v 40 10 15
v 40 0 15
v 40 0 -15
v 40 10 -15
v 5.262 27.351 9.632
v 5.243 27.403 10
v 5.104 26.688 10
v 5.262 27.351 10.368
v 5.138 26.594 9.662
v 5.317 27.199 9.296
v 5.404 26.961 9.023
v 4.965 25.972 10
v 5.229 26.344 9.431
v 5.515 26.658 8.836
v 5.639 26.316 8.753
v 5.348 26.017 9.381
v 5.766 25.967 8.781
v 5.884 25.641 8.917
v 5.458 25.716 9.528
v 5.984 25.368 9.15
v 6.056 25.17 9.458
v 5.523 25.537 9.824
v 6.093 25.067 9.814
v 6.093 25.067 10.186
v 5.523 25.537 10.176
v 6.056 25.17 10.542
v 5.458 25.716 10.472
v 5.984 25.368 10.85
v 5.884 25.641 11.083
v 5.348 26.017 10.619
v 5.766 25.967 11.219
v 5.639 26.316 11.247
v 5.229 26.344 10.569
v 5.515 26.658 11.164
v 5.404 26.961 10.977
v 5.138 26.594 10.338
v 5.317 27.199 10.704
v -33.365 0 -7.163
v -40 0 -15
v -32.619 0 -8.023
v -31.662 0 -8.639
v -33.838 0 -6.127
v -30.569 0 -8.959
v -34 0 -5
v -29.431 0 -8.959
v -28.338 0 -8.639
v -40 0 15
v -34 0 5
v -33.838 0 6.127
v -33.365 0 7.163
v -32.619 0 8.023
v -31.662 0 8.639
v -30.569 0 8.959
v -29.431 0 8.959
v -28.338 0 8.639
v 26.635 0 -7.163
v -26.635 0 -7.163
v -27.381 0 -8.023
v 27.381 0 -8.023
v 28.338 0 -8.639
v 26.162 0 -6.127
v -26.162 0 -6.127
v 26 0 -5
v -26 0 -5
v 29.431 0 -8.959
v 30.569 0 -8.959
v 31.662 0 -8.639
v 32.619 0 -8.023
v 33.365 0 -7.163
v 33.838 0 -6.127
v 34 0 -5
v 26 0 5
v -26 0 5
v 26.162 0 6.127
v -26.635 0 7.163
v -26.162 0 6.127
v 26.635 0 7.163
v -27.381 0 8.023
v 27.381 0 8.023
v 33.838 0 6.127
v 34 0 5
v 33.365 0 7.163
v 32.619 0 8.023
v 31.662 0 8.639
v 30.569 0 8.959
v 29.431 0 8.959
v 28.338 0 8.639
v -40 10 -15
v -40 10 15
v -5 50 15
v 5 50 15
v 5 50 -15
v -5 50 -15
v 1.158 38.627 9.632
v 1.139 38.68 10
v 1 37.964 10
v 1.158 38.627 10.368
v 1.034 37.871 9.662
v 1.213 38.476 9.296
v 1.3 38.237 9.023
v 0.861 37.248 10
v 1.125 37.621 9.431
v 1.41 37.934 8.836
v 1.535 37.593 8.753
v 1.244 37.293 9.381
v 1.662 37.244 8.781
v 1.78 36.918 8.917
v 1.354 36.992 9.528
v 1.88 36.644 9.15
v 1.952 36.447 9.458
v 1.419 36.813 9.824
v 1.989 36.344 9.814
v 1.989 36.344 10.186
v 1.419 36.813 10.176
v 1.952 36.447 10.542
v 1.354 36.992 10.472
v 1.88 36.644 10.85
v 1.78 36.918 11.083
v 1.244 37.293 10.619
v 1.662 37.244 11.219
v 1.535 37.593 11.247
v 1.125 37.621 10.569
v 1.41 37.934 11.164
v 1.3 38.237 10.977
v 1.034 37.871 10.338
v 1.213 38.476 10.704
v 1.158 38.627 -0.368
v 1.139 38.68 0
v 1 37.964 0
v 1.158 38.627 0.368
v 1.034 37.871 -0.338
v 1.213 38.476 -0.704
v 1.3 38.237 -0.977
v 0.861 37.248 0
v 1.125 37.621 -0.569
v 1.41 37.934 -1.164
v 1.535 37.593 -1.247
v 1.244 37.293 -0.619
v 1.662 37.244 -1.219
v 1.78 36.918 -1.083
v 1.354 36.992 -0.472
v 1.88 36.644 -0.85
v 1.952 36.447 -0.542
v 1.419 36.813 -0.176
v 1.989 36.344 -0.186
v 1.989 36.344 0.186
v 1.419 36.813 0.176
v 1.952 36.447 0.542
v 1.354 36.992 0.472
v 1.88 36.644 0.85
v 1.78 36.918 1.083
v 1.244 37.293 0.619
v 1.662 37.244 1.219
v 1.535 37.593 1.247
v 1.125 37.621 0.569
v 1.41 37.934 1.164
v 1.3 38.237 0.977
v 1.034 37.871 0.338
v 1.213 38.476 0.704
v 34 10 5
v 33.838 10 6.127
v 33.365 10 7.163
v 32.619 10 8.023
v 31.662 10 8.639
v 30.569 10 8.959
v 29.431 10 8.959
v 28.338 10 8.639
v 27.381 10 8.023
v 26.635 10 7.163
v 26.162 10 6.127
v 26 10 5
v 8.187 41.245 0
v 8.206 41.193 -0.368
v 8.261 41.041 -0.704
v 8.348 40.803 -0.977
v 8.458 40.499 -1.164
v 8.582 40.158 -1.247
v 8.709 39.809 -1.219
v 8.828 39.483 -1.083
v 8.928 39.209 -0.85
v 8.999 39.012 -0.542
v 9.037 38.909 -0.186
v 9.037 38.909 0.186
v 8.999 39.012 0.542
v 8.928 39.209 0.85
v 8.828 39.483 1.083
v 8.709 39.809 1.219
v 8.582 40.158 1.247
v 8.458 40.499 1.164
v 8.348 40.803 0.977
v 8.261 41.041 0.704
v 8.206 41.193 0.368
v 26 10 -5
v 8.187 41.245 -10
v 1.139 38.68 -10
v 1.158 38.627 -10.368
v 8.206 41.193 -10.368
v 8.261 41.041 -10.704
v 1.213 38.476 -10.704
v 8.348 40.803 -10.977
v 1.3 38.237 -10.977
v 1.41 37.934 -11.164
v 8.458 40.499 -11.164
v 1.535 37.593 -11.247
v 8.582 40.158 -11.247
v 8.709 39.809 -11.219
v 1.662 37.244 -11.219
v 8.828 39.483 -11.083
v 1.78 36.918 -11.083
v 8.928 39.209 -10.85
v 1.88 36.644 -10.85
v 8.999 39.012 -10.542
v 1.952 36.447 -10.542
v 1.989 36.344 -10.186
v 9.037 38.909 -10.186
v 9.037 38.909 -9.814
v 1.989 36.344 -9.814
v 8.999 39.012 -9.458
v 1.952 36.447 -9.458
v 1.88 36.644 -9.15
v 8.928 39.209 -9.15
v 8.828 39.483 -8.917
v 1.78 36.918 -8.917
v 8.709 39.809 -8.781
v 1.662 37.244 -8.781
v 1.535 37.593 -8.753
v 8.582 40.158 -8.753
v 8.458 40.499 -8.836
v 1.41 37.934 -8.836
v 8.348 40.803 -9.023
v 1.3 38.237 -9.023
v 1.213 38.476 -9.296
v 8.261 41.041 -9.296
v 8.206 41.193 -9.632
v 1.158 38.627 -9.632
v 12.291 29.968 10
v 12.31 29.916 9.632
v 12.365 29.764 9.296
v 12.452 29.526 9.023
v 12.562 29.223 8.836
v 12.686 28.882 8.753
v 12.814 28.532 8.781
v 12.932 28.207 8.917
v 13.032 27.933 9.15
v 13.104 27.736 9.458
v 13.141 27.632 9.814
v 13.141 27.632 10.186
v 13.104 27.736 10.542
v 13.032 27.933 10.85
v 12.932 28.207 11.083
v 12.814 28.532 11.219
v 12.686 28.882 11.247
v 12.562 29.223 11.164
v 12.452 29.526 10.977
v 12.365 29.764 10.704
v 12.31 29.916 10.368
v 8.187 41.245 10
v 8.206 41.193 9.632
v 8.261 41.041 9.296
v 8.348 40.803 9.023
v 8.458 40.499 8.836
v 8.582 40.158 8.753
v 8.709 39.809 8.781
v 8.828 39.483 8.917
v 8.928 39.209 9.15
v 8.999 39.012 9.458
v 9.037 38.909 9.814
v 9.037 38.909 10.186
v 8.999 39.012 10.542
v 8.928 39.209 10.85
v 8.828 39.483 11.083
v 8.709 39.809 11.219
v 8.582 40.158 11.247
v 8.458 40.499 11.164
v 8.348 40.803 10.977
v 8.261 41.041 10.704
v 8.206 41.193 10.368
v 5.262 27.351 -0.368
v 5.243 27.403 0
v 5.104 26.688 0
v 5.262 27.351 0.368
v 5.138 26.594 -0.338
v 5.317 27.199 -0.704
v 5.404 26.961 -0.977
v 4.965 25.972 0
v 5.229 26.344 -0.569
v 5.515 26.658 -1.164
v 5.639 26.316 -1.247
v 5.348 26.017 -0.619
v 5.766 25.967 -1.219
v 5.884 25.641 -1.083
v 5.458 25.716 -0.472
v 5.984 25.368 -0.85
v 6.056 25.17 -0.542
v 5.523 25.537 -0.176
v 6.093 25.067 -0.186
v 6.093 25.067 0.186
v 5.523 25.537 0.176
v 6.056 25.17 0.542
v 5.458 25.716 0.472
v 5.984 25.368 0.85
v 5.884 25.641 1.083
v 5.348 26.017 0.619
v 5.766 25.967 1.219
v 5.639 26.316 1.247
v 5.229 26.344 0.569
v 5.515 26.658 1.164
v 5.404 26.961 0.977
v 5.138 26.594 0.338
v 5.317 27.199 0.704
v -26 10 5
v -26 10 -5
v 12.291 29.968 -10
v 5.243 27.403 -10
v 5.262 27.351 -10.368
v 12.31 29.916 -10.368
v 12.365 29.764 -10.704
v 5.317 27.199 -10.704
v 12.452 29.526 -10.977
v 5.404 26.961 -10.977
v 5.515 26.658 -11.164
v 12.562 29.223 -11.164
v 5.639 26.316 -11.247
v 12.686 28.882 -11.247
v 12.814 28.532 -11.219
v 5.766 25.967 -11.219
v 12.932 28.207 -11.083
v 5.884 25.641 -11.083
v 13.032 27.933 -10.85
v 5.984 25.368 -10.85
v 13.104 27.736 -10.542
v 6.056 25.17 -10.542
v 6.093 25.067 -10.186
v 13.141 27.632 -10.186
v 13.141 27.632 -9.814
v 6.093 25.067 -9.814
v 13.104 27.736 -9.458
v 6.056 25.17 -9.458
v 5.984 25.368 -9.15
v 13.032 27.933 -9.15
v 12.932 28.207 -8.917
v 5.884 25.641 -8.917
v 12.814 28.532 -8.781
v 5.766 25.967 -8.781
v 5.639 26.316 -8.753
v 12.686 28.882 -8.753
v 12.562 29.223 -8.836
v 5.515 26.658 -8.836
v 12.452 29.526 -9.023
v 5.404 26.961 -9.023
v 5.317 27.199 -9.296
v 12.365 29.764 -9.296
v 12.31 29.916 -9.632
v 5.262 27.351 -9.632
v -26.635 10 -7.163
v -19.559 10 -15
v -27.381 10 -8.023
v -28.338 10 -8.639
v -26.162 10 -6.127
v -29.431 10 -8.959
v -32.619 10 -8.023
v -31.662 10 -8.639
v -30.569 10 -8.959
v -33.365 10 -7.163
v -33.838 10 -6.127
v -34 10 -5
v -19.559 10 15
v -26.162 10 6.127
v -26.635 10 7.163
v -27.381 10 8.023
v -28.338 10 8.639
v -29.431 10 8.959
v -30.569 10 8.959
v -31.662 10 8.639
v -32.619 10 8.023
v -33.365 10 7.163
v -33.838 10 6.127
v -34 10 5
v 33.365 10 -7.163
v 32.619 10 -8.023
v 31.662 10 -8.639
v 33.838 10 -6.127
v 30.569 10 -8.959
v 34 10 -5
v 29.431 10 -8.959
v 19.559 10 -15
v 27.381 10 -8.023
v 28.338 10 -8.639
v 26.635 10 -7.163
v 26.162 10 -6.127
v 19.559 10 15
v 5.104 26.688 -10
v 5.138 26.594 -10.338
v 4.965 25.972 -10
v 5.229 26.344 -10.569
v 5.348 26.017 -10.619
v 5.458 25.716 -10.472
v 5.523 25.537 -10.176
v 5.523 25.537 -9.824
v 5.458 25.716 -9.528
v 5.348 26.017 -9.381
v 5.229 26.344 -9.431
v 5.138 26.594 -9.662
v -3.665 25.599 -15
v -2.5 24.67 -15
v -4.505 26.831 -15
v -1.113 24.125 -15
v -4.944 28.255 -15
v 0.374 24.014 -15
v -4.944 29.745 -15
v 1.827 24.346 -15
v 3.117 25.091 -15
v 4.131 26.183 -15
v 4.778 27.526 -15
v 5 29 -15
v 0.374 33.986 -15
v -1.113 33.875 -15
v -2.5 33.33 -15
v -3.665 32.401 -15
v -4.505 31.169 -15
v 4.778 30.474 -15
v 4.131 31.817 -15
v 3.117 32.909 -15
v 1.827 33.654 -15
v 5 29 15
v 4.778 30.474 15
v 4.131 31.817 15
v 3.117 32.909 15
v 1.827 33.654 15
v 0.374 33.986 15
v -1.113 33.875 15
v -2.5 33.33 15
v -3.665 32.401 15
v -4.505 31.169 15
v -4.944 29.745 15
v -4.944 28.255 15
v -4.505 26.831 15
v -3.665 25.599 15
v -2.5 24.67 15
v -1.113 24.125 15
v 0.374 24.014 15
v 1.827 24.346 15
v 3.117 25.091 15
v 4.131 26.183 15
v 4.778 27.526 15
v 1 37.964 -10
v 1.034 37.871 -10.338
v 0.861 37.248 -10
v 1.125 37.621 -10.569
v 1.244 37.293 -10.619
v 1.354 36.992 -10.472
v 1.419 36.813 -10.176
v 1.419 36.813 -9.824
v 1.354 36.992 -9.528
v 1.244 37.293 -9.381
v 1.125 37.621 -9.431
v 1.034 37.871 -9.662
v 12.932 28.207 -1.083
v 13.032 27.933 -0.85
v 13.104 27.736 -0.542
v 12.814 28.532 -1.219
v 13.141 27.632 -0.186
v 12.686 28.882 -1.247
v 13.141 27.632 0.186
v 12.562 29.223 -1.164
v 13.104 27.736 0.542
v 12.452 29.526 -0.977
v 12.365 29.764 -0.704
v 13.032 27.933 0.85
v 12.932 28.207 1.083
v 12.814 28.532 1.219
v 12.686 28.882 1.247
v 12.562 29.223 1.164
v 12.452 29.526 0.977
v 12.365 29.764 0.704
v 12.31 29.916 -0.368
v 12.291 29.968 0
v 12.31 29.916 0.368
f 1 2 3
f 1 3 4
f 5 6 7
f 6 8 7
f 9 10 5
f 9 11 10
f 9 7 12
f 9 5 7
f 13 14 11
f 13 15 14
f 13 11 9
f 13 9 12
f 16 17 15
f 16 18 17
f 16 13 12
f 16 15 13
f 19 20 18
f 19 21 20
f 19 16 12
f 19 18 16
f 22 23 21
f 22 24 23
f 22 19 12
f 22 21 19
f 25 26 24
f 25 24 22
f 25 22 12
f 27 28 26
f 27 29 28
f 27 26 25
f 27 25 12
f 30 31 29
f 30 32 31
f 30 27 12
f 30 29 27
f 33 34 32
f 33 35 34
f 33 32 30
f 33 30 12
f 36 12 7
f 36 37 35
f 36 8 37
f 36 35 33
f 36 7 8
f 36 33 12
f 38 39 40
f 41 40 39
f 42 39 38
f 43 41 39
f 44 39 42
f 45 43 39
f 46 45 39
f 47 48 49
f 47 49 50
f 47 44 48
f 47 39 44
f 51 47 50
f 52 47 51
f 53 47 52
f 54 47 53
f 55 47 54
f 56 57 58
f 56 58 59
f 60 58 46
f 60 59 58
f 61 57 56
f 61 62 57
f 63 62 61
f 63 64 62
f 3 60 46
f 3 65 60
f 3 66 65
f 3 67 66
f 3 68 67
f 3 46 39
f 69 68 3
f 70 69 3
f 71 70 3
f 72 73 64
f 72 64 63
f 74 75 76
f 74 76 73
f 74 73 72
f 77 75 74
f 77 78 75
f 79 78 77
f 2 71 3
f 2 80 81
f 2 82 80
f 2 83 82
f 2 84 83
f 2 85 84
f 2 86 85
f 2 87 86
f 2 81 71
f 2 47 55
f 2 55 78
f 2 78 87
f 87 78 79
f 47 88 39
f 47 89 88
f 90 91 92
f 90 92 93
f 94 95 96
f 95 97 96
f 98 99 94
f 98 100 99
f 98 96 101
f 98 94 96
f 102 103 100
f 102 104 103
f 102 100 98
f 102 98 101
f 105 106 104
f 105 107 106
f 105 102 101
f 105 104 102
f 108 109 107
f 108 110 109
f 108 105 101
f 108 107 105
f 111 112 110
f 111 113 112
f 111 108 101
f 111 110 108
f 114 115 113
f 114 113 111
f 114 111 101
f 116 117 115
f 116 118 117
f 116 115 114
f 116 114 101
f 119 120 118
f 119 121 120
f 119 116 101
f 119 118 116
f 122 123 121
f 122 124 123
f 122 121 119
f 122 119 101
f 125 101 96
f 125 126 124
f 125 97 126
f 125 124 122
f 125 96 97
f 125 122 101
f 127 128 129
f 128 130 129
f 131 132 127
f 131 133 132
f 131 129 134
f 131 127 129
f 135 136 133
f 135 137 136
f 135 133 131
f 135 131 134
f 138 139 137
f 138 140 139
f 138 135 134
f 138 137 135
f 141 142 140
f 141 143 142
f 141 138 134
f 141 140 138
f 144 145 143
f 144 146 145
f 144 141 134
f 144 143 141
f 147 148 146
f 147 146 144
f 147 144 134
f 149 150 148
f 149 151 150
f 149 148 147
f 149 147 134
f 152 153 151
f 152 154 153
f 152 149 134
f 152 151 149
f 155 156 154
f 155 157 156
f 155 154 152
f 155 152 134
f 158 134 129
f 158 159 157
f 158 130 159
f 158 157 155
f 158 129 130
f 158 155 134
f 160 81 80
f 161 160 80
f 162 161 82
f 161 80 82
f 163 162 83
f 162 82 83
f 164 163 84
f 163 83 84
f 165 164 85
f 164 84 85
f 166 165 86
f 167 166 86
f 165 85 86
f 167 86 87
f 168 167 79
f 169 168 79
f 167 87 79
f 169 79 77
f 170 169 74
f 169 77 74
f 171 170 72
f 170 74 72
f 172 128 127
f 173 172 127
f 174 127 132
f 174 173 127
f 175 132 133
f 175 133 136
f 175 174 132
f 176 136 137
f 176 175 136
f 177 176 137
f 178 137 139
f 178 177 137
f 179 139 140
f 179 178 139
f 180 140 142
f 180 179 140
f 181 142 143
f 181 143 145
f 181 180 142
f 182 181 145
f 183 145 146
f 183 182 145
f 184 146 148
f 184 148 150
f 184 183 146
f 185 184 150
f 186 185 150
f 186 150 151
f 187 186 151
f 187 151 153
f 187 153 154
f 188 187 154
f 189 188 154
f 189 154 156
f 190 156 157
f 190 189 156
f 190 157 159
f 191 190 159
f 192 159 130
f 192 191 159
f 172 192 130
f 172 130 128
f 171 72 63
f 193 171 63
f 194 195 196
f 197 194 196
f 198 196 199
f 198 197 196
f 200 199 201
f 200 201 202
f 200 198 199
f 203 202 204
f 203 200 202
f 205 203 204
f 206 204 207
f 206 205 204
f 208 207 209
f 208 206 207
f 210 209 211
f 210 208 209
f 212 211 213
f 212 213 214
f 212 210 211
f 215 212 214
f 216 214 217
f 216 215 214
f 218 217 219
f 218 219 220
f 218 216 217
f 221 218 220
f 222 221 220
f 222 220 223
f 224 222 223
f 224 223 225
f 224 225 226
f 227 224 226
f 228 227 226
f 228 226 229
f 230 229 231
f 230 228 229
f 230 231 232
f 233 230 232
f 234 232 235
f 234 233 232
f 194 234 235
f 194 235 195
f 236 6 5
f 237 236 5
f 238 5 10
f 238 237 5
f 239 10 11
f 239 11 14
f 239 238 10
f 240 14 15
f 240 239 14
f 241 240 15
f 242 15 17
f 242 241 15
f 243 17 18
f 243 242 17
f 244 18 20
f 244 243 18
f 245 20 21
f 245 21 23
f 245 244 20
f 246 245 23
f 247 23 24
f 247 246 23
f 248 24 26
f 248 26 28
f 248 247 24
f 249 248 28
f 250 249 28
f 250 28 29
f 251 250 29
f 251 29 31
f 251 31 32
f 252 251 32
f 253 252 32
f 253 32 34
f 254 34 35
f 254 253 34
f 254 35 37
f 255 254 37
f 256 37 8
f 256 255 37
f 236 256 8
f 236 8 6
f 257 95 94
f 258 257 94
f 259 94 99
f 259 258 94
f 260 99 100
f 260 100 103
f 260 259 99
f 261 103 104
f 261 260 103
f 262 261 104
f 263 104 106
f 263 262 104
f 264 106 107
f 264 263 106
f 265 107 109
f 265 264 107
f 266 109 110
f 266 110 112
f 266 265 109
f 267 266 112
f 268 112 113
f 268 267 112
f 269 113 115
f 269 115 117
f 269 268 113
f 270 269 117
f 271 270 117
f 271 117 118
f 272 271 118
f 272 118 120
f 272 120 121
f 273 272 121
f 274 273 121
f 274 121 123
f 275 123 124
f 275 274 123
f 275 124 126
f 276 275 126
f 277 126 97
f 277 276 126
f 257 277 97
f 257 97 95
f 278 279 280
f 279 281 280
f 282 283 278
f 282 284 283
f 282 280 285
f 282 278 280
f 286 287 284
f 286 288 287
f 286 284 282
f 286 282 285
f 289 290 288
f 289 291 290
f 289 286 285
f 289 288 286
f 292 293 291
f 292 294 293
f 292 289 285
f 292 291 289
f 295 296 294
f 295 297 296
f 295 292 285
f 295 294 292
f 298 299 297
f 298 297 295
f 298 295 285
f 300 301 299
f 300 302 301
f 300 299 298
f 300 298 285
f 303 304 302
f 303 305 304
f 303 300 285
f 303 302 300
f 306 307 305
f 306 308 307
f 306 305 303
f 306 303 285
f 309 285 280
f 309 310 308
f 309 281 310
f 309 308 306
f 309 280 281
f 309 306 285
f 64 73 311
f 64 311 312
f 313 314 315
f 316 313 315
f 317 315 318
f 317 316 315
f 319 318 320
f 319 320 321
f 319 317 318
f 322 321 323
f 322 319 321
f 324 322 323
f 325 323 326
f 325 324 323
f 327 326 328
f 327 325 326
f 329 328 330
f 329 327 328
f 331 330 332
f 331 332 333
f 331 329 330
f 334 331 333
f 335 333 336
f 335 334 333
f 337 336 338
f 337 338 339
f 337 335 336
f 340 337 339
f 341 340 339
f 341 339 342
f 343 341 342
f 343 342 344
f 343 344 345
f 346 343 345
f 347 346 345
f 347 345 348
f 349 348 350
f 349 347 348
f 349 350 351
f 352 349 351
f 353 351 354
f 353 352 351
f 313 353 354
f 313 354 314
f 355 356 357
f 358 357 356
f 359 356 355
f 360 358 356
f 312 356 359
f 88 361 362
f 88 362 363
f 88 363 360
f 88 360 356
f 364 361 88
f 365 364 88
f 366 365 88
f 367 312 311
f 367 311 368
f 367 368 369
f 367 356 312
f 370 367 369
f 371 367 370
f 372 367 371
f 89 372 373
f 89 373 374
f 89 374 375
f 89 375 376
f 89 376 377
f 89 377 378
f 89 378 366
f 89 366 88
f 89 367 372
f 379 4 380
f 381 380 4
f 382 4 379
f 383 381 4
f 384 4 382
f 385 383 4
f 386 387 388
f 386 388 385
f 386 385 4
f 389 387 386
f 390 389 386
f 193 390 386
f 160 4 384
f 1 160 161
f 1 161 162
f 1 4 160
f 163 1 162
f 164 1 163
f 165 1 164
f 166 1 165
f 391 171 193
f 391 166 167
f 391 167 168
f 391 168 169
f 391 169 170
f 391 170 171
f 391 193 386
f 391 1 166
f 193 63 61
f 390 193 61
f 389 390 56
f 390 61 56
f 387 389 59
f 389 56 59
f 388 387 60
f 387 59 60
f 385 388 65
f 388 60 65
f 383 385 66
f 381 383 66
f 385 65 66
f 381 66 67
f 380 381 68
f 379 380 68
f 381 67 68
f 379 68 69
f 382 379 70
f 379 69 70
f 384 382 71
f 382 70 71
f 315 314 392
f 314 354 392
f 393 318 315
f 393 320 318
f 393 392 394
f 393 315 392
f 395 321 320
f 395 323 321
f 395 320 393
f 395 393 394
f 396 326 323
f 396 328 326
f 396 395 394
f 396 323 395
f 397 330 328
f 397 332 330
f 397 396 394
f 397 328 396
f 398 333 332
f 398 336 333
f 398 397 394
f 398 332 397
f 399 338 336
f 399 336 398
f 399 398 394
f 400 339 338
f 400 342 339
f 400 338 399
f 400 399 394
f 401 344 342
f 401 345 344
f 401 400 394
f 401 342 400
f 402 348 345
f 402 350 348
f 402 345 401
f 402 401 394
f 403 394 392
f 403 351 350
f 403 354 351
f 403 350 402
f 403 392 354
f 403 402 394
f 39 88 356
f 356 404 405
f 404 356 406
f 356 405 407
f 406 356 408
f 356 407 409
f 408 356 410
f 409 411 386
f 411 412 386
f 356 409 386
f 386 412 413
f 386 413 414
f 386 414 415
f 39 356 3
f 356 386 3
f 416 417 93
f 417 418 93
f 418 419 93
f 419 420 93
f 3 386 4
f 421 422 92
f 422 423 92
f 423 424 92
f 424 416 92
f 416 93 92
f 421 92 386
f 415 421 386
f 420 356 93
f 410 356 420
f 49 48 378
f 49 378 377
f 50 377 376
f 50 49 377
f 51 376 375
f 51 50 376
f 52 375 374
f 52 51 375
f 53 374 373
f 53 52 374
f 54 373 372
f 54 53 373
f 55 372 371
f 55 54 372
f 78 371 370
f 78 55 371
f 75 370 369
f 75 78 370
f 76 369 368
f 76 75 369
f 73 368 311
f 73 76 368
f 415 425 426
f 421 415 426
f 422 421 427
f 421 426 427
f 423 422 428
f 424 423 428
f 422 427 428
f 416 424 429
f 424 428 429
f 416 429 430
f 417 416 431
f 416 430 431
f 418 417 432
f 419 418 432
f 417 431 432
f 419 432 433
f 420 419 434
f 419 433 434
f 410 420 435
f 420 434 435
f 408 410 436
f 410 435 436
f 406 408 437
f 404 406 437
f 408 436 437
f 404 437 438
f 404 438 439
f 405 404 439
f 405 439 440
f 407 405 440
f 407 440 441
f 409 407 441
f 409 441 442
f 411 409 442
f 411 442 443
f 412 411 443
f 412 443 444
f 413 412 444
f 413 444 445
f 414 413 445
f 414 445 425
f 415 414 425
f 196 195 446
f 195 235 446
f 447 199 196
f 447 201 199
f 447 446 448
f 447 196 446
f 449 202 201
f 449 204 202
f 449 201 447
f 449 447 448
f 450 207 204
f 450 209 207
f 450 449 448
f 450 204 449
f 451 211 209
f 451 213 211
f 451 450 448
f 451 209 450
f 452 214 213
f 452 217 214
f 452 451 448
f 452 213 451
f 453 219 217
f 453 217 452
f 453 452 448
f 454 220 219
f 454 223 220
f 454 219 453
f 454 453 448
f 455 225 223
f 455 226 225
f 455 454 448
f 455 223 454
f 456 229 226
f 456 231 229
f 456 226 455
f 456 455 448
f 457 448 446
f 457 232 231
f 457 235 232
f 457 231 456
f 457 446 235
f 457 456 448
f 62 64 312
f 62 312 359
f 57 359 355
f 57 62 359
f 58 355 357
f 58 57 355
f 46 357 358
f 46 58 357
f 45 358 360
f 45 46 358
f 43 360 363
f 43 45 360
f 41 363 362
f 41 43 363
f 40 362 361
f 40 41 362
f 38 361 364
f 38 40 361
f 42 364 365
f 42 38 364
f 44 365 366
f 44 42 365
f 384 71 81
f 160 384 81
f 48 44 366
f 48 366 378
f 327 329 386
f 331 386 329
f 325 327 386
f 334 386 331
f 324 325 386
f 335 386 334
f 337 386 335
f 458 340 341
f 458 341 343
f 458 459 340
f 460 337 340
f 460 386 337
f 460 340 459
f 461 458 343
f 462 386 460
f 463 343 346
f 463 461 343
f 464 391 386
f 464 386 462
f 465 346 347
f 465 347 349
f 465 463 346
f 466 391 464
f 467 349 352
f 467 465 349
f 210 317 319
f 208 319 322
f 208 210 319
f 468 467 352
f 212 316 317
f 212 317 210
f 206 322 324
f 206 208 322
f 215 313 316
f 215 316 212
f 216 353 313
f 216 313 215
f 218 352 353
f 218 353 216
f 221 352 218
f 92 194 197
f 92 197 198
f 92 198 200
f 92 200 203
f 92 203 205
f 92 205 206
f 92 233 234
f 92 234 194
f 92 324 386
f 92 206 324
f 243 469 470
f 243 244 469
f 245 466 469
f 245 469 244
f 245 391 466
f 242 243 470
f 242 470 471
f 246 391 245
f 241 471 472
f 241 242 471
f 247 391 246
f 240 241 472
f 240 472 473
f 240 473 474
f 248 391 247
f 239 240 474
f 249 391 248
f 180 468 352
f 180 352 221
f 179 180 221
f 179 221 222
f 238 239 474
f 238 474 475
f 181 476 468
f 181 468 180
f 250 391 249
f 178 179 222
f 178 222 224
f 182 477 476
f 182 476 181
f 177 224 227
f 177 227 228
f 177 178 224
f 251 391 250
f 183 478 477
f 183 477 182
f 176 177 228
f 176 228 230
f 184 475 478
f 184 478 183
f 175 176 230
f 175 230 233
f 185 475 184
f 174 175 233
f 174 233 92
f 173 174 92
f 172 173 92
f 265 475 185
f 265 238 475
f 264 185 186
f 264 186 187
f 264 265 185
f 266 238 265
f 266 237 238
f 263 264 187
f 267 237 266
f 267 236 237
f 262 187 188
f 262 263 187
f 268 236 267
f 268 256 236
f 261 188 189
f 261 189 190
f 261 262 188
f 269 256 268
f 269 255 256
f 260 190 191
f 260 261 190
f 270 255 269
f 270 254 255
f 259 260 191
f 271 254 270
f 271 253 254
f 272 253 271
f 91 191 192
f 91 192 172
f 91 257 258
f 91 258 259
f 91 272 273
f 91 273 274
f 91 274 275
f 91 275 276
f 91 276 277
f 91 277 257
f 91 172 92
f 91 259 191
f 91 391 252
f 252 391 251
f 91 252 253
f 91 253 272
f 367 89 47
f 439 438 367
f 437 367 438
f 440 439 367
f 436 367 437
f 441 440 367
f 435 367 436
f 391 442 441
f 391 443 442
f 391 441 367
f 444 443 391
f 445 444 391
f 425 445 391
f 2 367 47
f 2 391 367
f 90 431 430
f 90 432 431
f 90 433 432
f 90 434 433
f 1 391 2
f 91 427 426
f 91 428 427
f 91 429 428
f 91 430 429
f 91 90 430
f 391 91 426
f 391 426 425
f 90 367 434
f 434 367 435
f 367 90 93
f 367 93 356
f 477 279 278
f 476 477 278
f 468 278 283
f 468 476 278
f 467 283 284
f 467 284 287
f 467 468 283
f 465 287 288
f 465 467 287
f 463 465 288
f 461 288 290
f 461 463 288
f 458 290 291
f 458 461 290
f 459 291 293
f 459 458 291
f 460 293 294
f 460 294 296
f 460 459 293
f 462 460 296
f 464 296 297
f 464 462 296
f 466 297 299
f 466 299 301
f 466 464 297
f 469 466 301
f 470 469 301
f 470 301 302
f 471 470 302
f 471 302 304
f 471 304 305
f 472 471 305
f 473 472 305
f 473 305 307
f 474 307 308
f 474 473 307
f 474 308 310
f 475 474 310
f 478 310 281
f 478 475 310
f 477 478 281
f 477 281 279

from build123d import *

# Parameters (mm, degrees)
BASE_EXTRUDE_DEPTH   = 15
SLOT_CUT_DEPTH       = 66.76473219
SKETCH5_R            = 5
GUIDE_HOLE_DEPTH     = 71.710678119
LPATTERN1_COUNT      = 3
LPATTERN1_PITCH      = 10
LPATTERN1_COUNT_DIR2 = 2
LPATTERN1_PITCH_DIR2 = 12


with BuildPart() as part:
    # Sketch2 → Base Extrude (new, symmetric)
    with BuildSketch(Plane.XY):
        Polygon((-40, 0), (40, 0), (40, 10), (19.558809371, 10), (5, 50), (-5, 50), (-19.558809371, 10), (-40, 10), align=None)
    extrude(amount=BASE_EXTRUDE_DEPTH, both=True)

    # Sketch4 → Slot Cut (cut, through all)
    with BuildSketch(Plane(origin=(0, 0, 0), x_dir=(1, 0, 0), z_dir=(0, 1, 0))):
        with BuildLine():
            Line((26, -5), (26, 5))
            ThreePointArc((26, 5), (30, 9), (34, 5))
            Line((34, 5), (34, -5))
            ThreePointArc((34, -5), (30, -9), (26, -5))
        make_face()
    slot_cut = extrude(amount=SLOT_CUT_DEPTH, mode=Mode.SUBTRACT)

    # Mirror1: Slot Cut across plane
    add(slot_cut.mirror(Plane(origin=(0, 0, 0), x_dir=(0, 0, 1), z_dir=(1, 0, 0))), mode=Mode.SUBTRACT)

    # Sketch5 → Guide Hole (cut, through all)
    with BuildSketch(Plane.XY.offset(15)):
        with Locations((0, 29)):
            Circle(SKETCH5_R)
    extrude(amount=-GUIDE_HOLE_DEPTH, mode=Mode.SUBTRACT)

    # Sketch10 → M3x0.5 Tapped Hole2 (revolve, cut)
    with BuildSketch(Plane(origin=(12.718406504, 28.793852416, 10), x_dir=(-0.3420201433256662, 0.9396926207859093, 0), z_dir=(0, 0, 1))):
        Polygon((0, 0), (0, 8.251075774), (1.25, 7.5), (1.25, 0), align=None)
    m3x0_5_tapped_hole2 = revolve(axis=Axis((18.685454646, 30.965680326, 10), (-0.9396926207859093, -0.34202014332566616, 0)), mode=Mode.SUBTRACT)

    # LPattern1: M3x0.5 Tapped Hole2 3 × 2
    with Locations(*[Vector(0, 0, -1) * (i * LPATTERN1_PITCH) + Vector(-0.34202014332566616, 0.9396926207859094, 0) * (j * LPATTERN1_PITCH_DIR2) for i in range(LPATTERN1_COUNT) for j in range(LPATTERN1_COUNT_DIR2) if (i, j) != (0, 0)]):
        add(m3x0_5_tapped_hole2, mode=Mode.SUBTRACT)


solid = part.part
